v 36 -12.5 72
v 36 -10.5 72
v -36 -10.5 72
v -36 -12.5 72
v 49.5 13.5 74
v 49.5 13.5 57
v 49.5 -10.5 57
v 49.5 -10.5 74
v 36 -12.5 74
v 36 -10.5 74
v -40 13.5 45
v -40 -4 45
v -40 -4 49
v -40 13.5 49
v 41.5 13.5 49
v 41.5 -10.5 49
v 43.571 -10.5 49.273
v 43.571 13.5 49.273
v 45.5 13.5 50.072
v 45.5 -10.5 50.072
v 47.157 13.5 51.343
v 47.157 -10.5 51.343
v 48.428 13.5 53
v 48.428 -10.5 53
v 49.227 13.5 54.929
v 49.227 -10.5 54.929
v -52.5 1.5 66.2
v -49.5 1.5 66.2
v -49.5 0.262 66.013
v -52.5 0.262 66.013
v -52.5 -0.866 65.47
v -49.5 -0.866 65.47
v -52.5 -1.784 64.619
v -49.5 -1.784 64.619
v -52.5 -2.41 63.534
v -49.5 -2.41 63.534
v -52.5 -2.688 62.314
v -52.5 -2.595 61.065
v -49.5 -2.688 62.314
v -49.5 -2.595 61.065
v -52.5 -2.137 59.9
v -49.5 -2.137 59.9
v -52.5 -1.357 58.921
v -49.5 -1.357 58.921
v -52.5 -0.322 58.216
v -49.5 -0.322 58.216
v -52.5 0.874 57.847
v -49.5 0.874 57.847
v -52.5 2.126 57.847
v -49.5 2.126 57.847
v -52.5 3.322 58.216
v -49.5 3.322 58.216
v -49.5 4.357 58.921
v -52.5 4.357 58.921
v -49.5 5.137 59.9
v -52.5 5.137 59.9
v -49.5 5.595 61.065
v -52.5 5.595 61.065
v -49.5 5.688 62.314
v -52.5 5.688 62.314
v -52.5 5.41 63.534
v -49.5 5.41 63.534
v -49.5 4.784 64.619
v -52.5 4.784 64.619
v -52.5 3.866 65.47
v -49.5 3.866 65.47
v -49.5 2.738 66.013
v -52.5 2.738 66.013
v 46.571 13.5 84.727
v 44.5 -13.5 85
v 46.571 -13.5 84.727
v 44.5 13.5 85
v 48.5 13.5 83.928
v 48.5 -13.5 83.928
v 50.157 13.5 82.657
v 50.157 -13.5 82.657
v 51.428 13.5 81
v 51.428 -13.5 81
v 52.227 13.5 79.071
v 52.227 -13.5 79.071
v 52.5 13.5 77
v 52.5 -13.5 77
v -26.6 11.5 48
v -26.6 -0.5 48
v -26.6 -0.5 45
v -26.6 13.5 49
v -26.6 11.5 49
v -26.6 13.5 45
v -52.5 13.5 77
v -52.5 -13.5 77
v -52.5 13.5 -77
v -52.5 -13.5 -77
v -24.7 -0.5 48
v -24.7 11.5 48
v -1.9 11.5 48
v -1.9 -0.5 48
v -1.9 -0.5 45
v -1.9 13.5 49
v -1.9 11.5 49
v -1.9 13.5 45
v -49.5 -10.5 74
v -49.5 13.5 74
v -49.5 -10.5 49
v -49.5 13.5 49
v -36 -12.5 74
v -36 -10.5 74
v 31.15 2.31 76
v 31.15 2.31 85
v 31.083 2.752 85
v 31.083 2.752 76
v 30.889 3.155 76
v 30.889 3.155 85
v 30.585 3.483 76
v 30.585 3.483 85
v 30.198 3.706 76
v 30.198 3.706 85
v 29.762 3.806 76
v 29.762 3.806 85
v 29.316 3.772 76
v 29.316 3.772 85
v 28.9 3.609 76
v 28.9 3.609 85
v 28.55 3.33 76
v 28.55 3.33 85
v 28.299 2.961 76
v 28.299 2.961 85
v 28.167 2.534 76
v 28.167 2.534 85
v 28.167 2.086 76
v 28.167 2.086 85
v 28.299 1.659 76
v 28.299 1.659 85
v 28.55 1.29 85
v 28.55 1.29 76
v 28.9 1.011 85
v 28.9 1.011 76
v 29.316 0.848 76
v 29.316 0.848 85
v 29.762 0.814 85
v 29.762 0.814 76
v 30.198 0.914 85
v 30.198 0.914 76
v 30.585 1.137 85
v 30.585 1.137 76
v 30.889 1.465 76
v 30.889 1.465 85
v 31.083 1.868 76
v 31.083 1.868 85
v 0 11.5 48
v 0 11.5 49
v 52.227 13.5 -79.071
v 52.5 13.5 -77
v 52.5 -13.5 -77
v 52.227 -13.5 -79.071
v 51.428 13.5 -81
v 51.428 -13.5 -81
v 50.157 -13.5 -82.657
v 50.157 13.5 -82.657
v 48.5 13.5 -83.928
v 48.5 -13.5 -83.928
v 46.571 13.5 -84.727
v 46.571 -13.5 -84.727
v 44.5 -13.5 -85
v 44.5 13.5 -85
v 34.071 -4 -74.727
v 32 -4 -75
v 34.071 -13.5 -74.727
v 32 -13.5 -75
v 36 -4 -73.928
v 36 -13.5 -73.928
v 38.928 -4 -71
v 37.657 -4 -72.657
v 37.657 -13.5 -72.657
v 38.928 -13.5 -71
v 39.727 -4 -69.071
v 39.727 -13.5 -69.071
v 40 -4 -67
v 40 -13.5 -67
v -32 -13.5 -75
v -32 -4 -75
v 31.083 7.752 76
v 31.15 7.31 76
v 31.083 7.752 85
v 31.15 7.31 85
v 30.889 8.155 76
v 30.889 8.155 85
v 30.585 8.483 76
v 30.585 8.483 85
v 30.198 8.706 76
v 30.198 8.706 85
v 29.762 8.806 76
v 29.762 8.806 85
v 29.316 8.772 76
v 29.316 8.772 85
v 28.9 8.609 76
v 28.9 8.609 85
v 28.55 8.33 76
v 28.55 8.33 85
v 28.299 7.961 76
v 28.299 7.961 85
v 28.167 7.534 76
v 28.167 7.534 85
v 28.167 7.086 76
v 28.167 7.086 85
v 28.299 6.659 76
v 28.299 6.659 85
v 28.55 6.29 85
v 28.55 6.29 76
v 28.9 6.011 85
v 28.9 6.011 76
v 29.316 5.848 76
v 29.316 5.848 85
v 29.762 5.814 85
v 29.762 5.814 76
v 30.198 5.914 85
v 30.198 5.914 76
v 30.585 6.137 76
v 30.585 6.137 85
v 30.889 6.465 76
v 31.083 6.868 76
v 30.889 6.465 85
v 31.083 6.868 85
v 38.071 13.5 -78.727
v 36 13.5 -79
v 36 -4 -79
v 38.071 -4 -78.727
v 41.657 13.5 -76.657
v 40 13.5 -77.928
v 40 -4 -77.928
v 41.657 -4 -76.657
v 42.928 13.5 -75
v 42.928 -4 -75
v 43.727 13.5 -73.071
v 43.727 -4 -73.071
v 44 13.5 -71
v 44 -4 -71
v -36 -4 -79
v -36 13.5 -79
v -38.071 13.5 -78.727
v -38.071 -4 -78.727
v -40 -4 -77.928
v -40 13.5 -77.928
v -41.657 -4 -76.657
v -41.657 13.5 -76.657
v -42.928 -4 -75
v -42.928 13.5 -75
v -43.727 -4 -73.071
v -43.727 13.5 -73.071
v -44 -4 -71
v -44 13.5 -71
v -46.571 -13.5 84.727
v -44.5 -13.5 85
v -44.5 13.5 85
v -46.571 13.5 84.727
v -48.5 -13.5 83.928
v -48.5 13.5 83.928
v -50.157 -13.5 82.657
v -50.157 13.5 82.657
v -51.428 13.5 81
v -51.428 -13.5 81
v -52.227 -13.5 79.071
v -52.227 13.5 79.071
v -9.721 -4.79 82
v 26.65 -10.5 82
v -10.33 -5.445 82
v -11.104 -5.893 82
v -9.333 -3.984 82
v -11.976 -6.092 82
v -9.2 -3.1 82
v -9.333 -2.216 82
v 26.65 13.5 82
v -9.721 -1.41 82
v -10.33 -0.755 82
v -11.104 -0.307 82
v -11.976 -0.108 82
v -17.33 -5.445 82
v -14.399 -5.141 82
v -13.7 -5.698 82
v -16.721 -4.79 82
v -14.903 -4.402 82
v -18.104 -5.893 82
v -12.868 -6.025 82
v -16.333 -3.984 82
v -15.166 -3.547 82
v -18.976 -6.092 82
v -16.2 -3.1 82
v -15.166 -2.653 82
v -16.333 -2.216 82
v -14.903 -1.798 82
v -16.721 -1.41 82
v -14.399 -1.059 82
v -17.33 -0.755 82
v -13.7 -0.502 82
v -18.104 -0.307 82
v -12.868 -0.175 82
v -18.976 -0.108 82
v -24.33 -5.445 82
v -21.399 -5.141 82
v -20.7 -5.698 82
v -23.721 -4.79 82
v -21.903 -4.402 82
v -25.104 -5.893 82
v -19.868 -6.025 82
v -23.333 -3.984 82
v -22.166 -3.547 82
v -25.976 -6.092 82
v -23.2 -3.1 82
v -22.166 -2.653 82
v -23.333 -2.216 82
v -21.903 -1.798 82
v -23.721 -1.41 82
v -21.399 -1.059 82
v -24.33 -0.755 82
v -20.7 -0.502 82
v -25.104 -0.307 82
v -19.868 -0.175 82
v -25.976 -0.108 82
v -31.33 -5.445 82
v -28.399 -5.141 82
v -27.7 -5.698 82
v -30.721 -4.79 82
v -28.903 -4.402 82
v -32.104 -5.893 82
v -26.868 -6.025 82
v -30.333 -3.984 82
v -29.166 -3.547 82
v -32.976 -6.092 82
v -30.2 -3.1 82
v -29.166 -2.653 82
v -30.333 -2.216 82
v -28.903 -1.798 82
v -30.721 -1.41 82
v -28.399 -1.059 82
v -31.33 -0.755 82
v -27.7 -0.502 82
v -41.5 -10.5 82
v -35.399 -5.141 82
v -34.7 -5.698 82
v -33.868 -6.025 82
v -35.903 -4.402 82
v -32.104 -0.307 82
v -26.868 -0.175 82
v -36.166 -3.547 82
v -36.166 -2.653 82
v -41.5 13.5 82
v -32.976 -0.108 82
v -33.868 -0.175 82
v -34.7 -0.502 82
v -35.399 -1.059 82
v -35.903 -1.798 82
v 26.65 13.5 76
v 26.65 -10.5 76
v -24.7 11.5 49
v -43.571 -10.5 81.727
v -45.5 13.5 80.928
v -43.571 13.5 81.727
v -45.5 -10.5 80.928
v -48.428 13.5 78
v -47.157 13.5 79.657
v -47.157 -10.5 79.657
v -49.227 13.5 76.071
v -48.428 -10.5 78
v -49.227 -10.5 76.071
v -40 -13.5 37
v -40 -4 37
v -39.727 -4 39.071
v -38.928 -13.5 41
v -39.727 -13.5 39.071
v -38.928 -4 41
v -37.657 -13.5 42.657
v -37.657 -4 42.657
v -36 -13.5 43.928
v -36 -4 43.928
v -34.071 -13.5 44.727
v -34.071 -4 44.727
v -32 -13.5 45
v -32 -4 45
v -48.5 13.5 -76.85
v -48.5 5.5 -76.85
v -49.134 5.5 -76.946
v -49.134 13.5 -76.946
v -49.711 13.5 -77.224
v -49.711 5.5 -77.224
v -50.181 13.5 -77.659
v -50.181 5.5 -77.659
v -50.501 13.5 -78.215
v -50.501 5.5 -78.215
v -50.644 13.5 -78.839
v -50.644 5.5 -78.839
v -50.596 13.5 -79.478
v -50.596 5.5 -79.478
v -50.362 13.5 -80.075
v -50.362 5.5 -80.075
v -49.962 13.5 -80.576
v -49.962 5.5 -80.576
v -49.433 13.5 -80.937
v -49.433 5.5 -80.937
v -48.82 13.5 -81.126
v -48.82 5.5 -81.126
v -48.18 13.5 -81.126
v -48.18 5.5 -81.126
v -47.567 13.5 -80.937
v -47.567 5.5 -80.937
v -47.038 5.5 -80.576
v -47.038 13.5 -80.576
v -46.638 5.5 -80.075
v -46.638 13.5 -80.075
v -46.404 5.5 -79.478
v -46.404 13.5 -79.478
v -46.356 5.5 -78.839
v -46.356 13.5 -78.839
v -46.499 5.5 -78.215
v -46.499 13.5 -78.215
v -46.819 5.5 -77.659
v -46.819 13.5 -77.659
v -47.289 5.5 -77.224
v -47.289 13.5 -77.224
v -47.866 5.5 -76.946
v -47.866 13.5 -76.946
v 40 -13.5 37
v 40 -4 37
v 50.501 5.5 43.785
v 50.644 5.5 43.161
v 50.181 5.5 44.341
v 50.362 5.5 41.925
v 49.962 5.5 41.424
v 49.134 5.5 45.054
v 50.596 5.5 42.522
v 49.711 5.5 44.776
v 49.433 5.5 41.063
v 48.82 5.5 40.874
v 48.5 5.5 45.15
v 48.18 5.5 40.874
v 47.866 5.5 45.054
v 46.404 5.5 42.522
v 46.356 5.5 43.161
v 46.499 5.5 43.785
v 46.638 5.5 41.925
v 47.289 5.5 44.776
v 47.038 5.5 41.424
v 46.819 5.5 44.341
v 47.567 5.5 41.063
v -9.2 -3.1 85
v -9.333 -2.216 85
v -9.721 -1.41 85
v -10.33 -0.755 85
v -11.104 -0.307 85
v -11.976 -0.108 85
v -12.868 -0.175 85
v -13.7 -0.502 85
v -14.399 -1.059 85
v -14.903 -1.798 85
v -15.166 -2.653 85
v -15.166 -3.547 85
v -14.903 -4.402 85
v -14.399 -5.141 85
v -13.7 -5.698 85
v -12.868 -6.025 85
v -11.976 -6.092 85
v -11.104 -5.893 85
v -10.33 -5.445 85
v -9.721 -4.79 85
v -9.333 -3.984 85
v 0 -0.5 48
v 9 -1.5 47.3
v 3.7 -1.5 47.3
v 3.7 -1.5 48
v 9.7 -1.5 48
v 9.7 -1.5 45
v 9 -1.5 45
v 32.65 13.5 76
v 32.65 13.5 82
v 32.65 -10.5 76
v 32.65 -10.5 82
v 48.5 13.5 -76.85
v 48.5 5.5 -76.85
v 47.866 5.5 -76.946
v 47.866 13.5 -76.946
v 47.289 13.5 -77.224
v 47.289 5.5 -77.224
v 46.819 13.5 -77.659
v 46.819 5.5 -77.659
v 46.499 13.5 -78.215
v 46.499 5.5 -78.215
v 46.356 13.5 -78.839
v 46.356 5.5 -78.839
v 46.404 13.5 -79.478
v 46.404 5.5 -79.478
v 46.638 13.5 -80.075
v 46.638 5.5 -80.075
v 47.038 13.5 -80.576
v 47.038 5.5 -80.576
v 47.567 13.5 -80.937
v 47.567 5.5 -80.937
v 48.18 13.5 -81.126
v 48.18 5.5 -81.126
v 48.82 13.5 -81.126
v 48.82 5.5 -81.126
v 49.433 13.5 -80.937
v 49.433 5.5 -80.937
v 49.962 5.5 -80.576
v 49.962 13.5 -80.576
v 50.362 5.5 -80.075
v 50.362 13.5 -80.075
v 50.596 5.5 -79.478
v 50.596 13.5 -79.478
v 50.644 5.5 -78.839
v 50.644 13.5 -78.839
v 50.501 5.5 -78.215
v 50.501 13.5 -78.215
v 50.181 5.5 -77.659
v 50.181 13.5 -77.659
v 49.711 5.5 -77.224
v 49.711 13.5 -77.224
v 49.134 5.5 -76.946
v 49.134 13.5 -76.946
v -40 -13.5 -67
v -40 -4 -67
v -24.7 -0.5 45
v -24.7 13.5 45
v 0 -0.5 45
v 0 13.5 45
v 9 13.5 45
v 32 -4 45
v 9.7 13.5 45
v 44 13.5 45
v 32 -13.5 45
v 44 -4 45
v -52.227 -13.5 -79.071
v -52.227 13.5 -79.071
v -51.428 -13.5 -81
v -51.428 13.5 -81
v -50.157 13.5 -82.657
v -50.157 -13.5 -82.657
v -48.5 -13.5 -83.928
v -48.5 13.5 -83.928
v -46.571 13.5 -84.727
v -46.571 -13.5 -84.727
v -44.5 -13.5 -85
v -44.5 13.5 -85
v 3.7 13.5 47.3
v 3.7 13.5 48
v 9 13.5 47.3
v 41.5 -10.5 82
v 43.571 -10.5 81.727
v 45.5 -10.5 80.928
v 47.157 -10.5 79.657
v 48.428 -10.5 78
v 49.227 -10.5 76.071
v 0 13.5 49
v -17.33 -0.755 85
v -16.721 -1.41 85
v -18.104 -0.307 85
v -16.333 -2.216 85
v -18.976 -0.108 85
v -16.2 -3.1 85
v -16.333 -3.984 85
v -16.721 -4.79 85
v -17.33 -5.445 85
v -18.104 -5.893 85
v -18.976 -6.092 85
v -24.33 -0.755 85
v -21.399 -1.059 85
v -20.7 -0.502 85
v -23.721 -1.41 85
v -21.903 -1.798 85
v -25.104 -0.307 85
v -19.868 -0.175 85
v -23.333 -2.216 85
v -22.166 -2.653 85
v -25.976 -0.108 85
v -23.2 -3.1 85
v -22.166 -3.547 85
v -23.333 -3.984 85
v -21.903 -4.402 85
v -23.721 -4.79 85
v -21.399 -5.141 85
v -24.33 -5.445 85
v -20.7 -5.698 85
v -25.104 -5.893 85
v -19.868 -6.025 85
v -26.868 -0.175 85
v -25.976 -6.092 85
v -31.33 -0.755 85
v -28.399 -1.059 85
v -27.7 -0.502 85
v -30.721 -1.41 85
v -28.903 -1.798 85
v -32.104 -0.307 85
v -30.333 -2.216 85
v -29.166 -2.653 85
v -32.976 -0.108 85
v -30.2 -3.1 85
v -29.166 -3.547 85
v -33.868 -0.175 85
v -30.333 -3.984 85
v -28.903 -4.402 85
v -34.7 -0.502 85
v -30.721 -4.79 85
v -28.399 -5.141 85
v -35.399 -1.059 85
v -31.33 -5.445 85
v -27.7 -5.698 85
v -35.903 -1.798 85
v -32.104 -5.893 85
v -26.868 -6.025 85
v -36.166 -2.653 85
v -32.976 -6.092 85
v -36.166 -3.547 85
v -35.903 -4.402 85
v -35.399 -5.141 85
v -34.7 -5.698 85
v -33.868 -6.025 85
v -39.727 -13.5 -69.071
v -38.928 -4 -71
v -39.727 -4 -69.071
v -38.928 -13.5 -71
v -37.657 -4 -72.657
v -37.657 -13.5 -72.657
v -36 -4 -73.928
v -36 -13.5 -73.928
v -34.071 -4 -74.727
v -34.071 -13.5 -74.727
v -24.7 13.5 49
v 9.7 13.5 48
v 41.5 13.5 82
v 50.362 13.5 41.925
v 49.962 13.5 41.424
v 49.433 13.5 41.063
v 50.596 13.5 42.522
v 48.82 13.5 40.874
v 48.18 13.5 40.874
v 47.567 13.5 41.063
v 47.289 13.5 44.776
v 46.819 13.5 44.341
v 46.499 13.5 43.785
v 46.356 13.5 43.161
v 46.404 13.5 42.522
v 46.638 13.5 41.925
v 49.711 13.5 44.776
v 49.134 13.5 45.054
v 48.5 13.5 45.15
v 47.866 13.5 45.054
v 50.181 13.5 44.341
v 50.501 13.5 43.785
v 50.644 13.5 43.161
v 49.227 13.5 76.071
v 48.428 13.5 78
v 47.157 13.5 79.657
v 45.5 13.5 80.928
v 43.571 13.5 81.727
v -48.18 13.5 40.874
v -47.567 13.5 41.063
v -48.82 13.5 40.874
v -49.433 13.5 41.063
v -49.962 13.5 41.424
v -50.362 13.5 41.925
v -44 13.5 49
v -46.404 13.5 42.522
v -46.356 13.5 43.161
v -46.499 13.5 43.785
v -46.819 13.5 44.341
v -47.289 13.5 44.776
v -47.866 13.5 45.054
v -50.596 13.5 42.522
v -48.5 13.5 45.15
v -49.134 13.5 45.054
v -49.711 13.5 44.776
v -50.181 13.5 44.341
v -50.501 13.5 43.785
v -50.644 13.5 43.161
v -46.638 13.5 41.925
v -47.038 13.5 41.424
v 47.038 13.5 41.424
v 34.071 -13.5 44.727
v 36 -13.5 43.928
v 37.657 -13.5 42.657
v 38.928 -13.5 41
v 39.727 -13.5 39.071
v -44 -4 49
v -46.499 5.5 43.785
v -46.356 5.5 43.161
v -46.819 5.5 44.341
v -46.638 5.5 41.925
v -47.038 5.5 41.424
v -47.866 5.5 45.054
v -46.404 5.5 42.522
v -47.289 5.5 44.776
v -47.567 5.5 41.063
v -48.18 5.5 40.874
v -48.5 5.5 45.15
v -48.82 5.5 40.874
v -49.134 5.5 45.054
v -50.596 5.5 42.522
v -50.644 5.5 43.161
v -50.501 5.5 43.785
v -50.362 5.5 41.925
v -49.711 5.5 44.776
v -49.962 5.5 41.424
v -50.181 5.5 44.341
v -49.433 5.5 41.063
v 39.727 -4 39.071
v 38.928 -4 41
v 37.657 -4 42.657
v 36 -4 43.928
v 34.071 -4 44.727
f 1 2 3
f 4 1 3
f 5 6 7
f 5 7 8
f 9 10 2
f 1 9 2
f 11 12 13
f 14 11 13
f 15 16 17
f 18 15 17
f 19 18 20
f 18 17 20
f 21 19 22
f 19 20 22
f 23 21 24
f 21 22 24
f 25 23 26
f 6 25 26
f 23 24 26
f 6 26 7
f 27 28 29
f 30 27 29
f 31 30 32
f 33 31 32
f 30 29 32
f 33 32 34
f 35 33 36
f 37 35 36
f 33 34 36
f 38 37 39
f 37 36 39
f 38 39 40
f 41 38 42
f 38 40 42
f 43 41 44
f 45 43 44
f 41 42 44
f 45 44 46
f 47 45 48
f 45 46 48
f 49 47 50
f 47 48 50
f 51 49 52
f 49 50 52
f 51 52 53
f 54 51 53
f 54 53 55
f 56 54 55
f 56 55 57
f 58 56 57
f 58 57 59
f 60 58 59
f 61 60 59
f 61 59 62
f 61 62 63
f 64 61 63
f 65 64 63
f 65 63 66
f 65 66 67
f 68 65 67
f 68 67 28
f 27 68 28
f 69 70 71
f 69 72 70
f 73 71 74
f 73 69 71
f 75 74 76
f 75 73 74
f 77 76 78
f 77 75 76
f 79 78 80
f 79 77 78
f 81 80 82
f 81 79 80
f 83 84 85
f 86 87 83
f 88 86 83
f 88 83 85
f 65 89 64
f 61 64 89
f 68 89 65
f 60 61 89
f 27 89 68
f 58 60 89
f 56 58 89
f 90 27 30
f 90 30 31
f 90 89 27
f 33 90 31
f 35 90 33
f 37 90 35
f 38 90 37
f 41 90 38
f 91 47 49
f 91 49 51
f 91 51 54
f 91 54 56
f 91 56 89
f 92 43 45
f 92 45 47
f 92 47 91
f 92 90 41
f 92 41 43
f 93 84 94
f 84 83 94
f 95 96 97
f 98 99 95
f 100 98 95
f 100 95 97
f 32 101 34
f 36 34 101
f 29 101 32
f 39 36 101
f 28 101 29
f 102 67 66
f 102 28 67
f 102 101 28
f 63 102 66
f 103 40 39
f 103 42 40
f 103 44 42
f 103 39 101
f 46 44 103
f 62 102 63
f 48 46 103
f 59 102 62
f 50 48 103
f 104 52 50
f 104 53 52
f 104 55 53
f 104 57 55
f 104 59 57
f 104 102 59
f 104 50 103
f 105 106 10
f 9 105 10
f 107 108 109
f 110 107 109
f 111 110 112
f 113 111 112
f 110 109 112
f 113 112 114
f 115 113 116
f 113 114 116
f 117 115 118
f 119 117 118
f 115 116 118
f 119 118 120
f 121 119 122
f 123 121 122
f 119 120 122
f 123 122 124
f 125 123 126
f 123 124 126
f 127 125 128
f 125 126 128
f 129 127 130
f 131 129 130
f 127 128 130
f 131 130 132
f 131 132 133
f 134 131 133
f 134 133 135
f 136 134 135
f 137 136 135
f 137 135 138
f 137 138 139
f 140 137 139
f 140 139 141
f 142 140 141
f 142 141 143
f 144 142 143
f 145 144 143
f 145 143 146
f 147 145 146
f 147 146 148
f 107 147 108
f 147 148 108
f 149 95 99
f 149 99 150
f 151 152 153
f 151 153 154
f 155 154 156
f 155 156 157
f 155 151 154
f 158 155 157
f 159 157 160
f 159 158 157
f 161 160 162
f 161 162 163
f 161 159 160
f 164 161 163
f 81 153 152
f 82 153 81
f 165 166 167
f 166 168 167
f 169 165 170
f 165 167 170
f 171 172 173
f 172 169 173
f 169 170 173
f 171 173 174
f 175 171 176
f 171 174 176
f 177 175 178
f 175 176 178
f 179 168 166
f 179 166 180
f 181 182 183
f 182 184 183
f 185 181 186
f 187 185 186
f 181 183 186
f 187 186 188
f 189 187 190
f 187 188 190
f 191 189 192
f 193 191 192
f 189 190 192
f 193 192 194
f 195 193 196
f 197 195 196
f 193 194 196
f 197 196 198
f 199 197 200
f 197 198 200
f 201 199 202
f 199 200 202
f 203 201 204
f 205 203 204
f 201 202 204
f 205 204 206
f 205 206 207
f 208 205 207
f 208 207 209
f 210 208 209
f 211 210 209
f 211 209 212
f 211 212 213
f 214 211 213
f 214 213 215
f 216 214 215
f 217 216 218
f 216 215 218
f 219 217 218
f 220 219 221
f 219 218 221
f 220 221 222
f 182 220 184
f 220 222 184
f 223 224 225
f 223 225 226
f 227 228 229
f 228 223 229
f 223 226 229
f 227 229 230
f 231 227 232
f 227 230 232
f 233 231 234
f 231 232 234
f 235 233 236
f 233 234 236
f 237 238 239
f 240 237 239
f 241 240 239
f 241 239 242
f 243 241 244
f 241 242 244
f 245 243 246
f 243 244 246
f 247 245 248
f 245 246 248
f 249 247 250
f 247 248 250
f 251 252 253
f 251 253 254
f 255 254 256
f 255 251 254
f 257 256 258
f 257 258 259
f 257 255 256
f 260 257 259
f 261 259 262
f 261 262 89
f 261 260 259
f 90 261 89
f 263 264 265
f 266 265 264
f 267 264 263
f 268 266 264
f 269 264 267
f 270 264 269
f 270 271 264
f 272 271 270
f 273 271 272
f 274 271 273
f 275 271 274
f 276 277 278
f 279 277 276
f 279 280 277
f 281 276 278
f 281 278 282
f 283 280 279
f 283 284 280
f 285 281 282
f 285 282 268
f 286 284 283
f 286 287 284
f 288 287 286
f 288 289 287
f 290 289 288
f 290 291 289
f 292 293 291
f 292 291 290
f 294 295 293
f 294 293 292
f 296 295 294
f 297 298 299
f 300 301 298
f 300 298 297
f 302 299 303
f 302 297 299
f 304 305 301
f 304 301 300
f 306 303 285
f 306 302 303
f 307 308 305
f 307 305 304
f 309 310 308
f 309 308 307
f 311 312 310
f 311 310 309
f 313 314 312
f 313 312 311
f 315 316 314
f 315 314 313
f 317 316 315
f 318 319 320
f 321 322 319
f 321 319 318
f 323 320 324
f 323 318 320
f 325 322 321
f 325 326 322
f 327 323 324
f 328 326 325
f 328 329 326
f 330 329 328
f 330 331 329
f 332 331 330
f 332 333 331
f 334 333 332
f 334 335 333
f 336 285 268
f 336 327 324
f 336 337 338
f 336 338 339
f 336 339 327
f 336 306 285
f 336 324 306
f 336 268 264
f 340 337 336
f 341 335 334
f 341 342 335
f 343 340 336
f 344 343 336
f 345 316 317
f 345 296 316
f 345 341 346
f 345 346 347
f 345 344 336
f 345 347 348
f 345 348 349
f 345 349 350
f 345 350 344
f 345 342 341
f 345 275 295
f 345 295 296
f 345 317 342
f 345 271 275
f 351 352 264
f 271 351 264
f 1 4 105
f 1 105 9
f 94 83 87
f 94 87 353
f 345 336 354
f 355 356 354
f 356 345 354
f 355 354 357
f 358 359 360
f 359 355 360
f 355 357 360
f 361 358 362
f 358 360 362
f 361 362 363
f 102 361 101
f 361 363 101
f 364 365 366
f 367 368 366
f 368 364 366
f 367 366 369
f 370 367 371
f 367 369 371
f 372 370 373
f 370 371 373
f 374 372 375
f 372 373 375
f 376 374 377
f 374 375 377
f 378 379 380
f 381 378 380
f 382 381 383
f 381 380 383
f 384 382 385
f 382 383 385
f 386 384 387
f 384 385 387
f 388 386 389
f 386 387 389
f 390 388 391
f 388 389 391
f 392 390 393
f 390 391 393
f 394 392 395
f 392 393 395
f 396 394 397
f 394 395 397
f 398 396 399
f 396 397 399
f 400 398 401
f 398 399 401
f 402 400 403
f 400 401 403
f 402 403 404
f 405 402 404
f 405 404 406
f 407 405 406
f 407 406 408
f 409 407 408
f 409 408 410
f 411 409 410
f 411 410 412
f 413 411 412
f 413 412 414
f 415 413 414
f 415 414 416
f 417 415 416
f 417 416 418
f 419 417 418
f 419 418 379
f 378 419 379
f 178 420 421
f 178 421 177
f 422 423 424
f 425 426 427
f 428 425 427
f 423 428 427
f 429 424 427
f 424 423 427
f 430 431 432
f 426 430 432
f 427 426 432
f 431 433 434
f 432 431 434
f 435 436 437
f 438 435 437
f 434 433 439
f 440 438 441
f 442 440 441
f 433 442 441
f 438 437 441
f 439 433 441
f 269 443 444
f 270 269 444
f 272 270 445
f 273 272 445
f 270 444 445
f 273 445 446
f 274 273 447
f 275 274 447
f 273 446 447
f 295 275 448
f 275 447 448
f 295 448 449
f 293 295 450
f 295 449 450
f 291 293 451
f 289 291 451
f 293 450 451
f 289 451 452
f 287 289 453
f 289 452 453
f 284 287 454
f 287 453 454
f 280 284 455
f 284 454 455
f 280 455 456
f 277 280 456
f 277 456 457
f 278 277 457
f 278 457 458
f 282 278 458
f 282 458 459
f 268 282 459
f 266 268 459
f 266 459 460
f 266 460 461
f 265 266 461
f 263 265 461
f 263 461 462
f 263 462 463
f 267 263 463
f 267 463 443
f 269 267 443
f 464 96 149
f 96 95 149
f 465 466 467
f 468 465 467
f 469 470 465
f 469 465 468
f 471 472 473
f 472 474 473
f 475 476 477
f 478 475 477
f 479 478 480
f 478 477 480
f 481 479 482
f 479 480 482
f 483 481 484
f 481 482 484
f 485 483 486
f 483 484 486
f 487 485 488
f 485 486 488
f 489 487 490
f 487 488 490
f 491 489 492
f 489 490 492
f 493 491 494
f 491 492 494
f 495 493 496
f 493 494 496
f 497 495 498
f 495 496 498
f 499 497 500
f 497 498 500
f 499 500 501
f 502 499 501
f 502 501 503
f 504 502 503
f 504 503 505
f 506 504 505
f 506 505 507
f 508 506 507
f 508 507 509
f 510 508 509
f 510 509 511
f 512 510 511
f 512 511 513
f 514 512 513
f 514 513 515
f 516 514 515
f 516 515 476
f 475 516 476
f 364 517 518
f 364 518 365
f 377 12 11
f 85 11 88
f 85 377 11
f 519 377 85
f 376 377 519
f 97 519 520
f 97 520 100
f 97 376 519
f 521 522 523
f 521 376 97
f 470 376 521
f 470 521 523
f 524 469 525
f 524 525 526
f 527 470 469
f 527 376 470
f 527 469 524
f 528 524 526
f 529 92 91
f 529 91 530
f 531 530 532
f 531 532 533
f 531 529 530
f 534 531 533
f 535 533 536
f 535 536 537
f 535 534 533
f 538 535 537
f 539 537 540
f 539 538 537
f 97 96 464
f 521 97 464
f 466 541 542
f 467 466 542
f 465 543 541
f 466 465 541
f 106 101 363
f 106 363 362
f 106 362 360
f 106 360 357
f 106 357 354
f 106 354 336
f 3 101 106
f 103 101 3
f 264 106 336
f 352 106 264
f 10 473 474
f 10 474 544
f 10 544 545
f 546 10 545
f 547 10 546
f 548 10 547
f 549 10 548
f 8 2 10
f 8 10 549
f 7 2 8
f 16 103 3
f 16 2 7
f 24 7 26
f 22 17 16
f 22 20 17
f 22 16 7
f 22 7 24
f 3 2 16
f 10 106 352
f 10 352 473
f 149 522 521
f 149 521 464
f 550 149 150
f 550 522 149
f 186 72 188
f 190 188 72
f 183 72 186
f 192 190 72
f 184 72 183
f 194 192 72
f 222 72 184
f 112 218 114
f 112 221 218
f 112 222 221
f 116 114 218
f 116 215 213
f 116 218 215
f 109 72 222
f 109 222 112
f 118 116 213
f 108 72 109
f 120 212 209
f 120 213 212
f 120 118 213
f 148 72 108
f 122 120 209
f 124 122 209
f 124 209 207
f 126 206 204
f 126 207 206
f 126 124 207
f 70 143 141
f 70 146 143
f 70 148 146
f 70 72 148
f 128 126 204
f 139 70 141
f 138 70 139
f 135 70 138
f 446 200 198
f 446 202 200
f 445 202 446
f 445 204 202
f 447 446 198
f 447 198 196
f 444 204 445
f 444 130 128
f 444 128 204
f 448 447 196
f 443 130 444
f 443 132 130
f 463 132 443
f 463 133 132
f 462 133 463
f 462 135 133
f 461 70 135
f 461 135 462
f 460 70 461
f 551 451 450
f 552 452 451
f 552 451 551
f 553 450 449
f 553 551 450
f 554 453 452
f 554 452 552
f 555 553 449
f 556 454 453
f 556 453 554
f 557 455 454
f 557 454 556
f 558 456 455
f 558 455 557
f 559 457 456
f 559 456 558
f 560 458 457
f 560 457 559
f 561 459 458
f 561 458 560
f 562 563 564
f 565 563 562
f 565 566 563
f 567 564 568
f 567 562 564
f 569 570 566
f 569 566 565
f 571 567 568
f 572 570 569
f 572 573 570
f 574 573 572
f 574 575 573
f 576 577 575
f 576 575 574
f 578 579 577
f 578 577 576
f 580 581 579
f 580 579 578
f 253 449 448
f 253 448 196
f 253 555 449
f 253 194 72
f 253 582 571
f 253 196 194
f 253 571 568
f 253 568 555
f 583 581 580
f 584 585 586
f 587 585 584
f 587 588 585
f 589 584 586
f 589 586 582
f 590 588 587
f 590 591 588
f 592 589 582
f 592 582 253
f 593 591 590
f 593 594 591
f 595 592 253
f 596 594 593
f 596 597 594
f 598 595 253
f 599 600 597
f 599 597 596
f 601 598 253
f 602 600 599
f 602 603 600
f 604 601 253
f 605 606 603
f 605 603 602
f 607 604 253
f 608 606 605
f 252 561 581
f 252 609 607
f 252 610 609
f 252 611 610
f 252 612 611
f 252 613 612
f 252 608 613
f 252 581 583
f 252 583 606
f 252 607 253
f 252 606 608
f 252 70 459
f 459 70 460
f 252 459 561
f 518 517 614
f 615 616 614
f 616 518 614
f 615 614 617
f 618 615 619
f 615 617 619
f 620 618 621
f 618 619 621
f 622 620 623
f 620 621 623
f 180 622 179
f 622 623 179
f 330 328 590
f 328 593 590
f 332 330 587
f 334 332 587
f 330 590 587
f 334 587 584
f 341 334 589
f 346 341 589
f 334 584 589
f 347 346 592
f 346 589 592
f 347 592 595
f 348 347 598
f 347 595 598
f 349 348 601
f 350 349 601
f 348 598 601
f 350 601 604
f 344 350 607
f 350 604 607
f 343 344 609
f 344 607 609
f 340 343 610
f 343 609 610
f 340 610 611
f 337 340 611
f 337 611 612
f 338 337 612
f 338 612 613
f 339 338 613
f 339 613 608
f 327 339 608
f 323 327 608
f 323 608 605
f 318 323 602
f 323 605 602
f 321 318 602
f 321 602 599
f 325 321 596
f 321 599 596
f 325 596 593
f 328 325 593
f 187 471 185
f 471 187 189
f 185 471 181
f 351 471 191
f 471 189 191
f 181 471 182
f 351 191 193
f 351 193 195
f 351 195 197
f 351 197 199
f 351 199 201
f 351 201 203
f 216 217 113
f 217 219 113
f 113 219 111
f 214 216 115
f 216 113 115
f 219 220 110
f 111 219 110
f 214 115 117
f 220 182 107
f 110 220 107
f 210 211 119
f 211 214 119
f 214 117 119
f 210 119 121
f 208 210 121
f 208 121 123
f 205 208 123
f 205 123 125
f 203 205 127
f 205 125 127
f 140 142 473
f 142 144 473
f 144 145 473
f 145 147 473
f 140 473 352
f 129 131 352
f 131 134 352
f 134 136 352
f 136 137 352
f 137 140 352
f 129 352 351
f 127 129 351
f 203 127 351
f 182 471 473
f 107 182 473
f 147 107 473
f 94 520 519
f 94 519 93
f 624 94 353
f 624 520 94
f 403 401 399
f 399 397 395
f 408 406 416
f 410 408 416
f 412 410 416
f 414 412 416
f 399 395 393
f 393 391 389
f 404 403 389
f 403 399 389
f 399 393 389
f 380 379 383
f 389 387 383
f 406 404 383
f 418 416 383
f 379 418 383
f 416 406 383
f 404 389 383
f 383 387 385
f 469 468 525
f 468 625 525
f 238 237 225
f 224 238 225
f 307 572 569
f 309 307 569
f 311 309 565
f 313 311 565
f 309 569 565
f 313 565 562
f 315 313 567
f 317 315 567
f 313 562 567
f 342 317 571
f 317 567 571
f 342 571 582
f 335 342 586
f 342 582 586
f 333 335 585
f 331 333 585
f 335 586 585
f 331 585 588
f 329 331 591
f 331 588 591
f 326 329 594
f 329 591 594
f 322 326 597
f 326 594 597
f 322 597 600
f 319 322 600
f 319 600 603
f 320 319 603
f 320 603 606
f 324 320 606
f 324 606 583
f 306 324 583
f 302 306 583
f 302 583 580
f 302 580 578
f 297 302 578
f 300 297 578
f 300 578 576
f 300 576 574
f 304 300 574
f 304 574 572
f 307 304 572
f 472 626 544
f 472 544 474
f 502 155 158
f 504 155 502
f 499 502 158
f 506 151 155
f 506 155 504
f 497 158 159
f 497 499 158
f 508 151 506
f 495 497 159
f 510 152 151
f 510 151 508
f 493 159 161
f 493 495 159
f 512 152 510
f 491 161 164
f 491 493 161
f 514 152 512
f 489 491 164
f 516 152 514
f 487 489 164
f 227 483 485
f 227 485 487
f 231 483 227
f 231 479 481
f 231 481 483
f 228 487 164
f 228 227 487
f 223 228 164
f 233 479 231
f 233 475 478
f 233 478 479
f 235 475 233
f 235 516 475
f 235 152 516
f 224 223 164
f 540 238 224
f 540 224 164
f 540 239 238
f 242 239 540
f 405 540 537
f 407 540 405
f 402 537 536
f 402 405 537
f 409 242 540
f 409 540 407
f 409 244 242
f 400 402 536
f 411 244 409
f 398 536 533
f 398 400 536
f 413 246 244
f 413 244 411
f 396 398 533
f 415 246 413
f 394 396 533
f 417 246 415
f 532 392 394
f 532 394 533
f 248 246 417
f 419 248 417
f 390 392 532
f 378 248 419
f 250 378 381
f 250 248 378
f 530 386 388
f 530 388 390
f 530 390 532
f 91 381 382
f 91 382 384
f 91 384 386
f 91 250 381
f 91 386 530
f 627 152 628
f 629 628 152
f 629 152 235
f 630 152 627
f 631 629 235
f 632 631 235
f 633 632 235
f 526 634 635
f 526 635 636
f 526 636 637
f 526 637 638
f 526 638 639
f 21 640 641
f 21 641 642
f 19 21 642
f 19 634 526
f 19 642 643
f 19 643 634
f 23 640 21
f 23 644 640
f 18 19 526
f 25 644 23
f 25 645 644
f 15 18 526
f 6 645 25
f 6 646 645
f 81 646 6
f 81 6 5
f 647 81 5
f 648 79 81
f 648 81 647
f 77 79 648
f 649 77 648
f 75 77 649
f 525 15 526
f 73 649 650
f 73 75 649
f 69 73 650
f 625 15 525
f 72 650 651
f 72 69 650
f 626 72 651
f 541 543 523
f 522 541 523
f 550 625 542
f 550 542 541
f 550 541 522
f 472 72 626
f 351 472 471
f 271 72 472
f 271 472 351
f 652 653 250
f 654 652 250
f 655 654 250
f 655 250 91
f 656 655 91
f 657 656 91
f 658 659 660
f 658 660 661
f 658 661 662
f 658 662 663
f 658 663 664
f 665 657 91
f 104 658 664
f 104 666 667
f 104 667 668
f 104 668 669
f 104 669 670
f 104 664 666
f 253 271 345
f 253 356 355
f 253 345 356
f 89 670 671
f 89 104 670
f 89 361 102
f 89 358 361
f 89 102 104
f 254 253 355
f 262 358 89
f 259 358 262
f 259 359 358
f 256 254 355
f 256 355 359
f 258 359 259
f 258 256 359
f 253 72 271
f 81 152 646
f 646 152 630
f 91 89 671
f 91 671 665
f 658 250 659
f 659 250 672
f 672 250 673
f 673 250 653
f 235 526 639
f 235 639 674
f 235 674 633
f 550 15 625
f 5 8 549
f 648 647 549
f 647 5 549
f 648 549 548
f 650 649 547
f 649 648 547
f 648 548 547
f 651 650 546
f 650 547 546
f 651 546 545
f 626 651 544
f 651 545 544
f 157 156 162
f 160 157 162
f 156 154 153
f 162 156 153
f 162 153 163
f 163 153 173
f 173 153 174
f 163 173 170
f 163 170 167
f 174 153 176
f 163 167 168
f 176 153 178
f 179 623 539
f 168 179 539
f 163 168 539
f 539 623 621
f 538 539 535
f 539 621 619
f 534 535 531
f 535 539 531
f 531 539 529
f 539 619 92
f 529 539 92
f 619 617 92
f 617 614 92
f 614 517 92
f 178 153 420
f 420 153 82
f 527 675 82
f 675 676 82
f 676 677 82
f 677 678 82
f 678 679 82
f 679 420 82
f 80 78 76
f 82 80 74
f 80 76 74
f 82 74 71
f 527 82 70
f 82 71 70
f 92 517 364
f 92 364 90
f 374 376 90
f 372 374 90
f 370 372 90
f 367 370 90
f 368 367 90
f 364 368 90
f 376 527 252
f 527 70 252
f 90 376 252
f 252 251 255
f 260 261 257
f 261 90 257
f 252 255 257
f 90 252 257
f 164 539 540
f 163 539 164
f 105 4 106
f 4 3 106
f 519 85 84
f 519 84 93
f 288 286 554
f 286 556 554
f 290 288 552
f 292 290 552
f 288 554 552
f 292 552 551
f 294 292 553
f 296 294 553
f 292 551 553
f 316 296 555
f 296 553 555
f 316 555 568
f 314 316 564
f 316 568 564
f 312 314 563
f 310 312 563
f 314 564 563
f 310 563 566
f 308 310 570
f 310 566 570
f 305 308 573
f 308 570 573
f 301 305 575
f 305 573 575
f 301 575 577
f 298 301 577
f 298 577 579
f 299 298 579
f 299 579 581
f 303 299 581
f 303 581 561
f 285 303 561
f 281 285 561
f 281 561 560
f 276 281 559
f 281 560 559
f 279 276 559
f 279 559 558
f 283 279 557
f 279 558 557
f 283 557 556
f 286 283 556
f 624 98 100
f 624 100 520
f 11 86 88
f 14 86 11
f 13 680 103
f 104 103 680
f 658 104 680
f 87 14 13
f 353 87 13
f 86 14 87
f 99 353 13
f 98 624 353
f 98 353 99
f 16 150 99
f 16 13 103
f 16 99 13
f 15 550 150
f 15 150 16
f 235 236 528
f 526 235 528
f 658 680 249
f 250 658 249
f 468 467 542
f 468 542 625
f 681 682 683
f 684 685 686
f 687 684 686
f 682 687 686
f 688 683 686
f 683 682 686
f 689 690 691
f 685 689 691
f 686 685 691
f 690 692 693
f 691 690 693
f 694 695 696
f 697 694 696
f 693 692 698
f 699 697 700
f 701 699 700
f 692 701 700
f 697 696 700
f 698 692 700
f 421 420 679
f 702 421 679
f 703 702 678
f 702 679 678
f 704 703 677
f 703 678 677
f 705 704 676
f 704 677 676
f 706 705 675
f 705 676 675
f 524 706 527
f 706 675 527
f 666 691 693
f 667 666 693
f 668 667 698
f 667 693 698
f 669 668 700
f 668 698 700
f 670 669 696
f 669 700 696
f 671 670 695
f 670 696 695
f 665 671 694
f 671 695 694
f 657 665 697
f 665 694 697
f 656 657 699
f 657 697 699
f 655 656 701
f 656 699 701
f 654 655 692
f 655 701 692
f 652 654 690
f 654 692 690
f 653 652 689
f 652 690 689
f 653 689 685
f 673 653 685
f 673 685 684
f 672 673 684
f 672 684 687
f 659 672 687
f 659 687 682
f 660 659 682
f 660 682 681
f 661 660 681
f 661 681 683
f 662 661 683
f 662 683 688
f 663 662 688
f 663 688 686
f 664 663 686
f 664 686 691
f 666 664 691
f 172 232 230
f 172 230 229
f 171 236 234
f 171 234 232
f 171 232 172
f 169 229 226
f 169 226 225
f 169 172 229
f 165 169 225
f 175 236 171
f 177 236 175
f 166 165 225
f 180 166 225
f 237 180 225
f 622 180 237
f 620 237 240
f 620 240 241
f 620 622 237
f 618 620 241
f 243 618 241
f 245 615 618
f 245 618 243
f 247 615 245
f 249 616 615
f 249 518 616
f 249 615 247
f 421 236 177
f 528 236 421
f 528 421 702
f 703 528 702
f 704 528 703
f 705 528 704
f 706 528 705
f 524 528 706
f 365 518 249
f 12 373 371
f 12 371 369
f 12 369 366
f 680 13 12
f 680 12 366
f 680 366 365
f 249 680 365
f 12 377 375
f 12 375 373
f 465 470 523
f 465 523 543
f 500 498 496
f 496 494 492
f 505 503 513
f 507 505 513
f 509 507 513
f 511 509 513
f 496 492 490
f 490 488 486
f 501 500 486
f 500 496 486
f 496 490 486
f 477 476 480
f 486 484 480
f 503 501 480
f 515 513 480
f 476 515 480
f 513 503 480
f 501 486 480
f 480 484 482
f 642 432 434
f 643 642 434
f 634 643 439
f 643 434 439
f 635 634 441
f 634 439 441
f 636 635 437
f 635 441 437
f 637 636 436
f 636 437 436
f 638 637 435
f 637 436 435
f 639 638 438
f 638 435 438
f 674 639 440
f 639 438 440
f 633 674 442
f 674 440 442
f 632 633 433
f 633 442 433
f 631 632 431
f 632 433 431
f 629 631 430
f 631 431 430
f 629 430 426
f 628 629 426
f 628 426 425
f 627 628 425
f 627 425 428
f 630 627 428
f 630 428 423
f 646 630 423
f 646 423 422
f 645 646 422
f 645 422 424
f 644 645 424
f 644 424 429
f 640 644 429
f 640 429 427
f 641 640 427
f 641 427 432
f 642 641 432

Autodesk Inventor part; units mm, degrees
ref_plane "YZ Plane" through (0, 0, 0) normal (1, 0, 0) x (0, 1, 0)
ref_plane "XZ Plane" through (0, 0, 0) normal (0, 1, 0) x (-1, 0, 0)
ref_plane "XY Plane" through (0, 0, 0) normal (0, 0, 1) x (1, 0, 0)
sketch "Sketch1" plane through (0, 0, 0) normal (0, 1, 0) x (-1, 0, 0)
  line L0 (-52.5, 85) -> (52.5, 85)
  line L1 (52.5, 85) -> (52.5, -85)
  line L2 (52.5, -85) -> (-52.5, -85)
  line L3 (-52.5, -85) -> (-52.5, 85)
  line L4 (-52.5, 85) -> (52.5, -85) construction
  line L5 (52.5, 85) -> (-52.5, -85) construction
  line L6 (40, 45) -> (-40, 45)
  line L7 (-40, 45) -> (-40, -75)
  line L8 (-40, -75) -> (40, -75)
  line L9 (40, -75) -> (40, 45)
  point P0 (0, 0)
  point P1 (0, -75)
  point P2 (0, 0)
  point P3 (0, -85)
  dimension "d0" = 120
  dimension "d1" = 80
  dimension "d2" = 105
  dimension "d3" = 10
  dimension "d4" = 170
extrude "Extrusion1" add sketch "Sketch1" along normal mid plane 27
sketch "Sketch2" plane through (0, 0, 0) normal (0, 1, 0) x (-1, 0, 0)
  line L0 (44, -79) -> (-44, -79)
  line L1 (-44, -79) -> (-44, 45)
  line L2 (-44, 45) -> (44, 45)
  line L3 (44, 45) -> (44, -79)
  line L4 (-40, -75) -> (40, -75) projected
  line L5 (40, -75) -> (40, 45) projected
  line L6 (-40, 45) -> (-40, -75) projected
  point P0 (0, 0)
  dimension "d7" = 4
  dimension "d8" = 4
  dimension "d9" = 4
extrude "Extrusion2" cut sketch "Sketch2" along normal blind 15 and the other way blind 4
sketch "Sketch3" plane through (0, 13.5, 0) normal (0, 1, 0) x (1, 0, 0)
  line L0 (-49.5, -49) -> (49.5, -49)
  line L1 (49.5, -49) -> (49.5, -82)
  line L2 (49.5, -82) -> (-49.5, -82)
  line L3 (-49.5, -82) -> (-49.5, -49)
  line L4 (-52.5, 85) -> (-52.5, -85) projected
  line L5 (-52.5, -85) -> (52.5, -85) projected
  line L6 (44, -45) -> (-44, -45) projected
  point P0 (0, 0)
  point P1 (0, -49)
  dimension "d14" = 3
  dimension "d15" = 3
  dimension "d16" = 4
extrude "Extrusion3" cut sketch "Sketch3" against normal blind 24
sketch "Sketch4" plane through (0, 13.5, 0) normal (0, 1, 0) x (1, 0, 0)
  line L0 (44, -45) -> (-44, -45) projected
  line L1 (-49.5, -49) -> (49.5, -49) projected
  line L2 (-44, -45) -> (-40, -45)
  line L3 (-40, -45) -> (-40, -49)
  line L4 (-40, -49) -> (-44, -49)
  line L5 (-44, -49) -> (-44, -45)
  point P0 (0, 0)
  point P1 (-40, 75)
extrude "Extrusion4" cut sketch "Sketch4" against normal up to surface (17.5 mm away)
sketch "Sketch5" plane through (0, 13.5, 0) normal (0, 1, 0) x (1, 0, 0)
  line L0 (44, -45) -> (-40, -45) projected
  line L1 (-26.6, -48) -> (-24.7, -48)
  line L2 (-24.7, -48) -> (-24.7, -45)
  line L3 (-24.7, -45) -> (-26.6, -45)
  line L4 (-26.6, -45) -> (-26.6, -48)
  line L5 (-1.9, -48) -> (0, -48)
  line L6 (0, -48) -> (0, -45)
  line L7 (0, -45) -> (-1.9, -45)
  line L8 (-1.9, -45) -> (-1.9, -48)
  line L9 (-40, -45) -> (40, -45) projected
  point P0 (0, 0)
  dimension "d21" = 1.9
  dimension "d22" = 1.9
  dimension "d23" = 22.8
  dimension "d24" = 3
extrude "Extrusion5" cut sketch "Sketch5" against normal blind 14
sketch "Sketch6" plane through (0, 13.5, 0) normal (0, 1, 0) x (1, 0, 0)
  line L0 (-40, -45) -> (40, -45) projected
  line L1 (9, -45) -> (9, -47.3)
  line L2 (9, -47.3) -> (3.7, -47.3)
  line L3 (3.7, -47.3) -> (3.7, -48)
  line L4 (3.7, -48) -> (9.7, -48)
  line L5 (9.7, -48) -> (9.7, -45)
  line L6 (0, -45) -> (0, -48) projected
  point P0 (0, 0)
  dimension "d27" = 0.7
  dimension "d28" = 0.7
  dimension "d29" = 3
  dimension "d30" = 6
  dimension "d31" = 9
extrude "Extrusion6" cut sketch "Sketch6" against normal blind 15
fillet "Fillet1" radius 8 12 edges at (-44, 4.75, -79) (44, 4.75, -79) (40, -8.75, -75) (-40, -8.75, -75) (52.5, 0, -85) (-52.5, 0, -85) (-52.5, 0, 85) (-49.5, 1.5, 82) (49.5, 1.5, 82) (52.5, 0, 85) (40, -8.75, 45) (-40, -8.75, 45)
sketch "Sketch7" plane through (0, -10.5, 0) normal (0, 1, 0) x (1, 0, 0)
  line L0 (-36, -74) -> (36, -74)
  line L1 (36, -74) -> (36, -72)
  line L2 (36, -72) -> (-36, -72)
  line L3 (-36, -72) -> (-36, -74)
  line L4 (41.5, -82) -> (-41.5, -82) projected
  point P0 (0, 0)
  point P1 (0, -72)
  dimension "d35" = 2
  dimension "d36" = 72
  dimension "d37" = 8
extrude "Extrusion7" cut sketch "Sketch7" against normal blind 2
sketch "Sketch8" plane through (-52.5, -13.5, 77) normal (-1, 0, 0) x (0, 0, 1)
  line L0 (0, 0) -> (-154, 0) projected
  line L1 (-3, 3) -> (-3, 27) projected
  point P0 (-77, 13.5)
  point P1 (-15, 15)
  dimension "d40" = 15
  dimension "d41" = 12
hole "Hole1" at (-52.5, 1.5, 62) direction (1, 0, 0) diameter 8.4 depth 8 tip angle 118
fillet "Fillet2" radius 8 1 edges at (49.5, 1.5, 49)
sketch "Sketch9" plane through (0, 13.5, 0) normal (0, 1, 0) x (1, 0, 0)
  line L0 (-48.5, 79) -> (48.5, 79) construction
  line L1 (48.5, 79) -> (48.5, -43) construction
  line L2 (48.5, -43) -> (-48.5, -43) construction
  line L3 (-48.5, -43) -> (-48.5, 79) construction
  line L4 (44.5, 85) -> (-44.5, 85) projected
  line L5 (-52.5, 77) -> (-52.5, -77) projected
  line L6 (-40, -49) -> (41.5, -49) projected
  point P0 (0, 0)
  point P1 (0, 79)
  dimension "d50" = 6
  dimension "d51" = 4
  dimension "d52" = 6
hole "Hole2" at (-48.5, 13.5, -79) at (48.5, 13.5, -79) at (48.5, 13.5, 43) at (-48.5, 13.5, 43) direction (0, -1, 0) diameter 4.3 depth 8
sketch "Sketch10" plane through (-44.5, 13.5, 85) normal (0, 0, 1) x (1, 0, 0)
  circle A0 centre (25.3, -16.6) radius 3
  circle A1 centre (32.3, -16.6) radius 3
  circle A2 centre (18.3, -16.6) radius 3
  circle A3 centre (11.3, -16.6) radius 3
  line L0 (-8, 0) -> (-8, -27) projected
  line L1 (89, -27) -> (0, -27) projected
  point P0 (44.5, -13.5)
  dimension "d60" = 6
  dimension "d61" = 6
  dimension "d62" = 6
  dimension "d63" = 6
  dimension "d64" = 7
  dimension "d65" = 7
  dimension "d66" = 7
  dimension "d67" = 19.3
  dimension "d68" = 10.4
extrude "Extrusion8" cut sketch "Sketch10" against normal blind 10
sketch "Sketch13" plane through (0, -10.5, 0) normal (0, 1, 0) x (1, 0, 0)
  line L0 (41.5, -82) -> (-41.5, -82) projected
  line L1 (26.65, -82) -> (32.65, -82)
  line L2 (32.65, -82) -> (32.65, -76)
  line L3 (32.65, -76) -> (26.65, -76)
  line L4 (26.65, -76) -> (26.65, -82)
  point P0 (0, 0)
  point P1 (52.5, -77)
  dimension "d78" = 6
  dimension "d79" = 6
  dimension "d82" = 19.85
extrude "Extrusion10" add sketch "Sketch13" along normal up to surface (24 mm away)
sketch "Sketch11" plane through (-44.5, 13.5, 85) normal (0, 0, 1) x (1, 0, 0)
  circle A0 centre (74.15, -11.19) radius 1.5
  circle A1 centre (74.15, -6.19) radius 1.5
  line L0 (89, -27) -> (0, -27) projected
  line L1 (97, -27) -> (97, 0) projected
  point P0 (44.5, -13.5)
  dimension "d71" = 3
  dimension "d72" = 3
  dimension "d73" = 5
  dimension "d76" = 20.81
  dimension "d77" = 22.85
extrude "Extrusion9" cut sketch "Sketch11" against normal blind 10
sketch "Sketch14" plane through (0, 13.5, 0) normal (0, 1, 0) x (1, 0, 0)
  line L0 (-24.7, -48) -> (-26.6, -48) projected
  line L1 (-40, -49) -> (41.5, -49) projected
  line L2 (-26.6, -48) -> (-24.7, -48)
  line L3 (-24.7, -48) -> (-24.7, -49)
  line L4 (-24.7, -49) -> (-26.6, -49)
  line L5 (-26.6, -49) -> (-26.6, -48)
  line L6 (0, -48) -> (-1.9, -48) projected
  line L7 (-1.9, -48) -> (0, -48)
  line L8 (0, -48) -> (0, -49)
  line L9 (0, -49) -> (-1.9, -49)
  line L10 (-1.9, -49) -> (-1.9, -48)
  point P0 (0, 0)
extrude "Extrusion11" cut sketch "Sketch14" against normal blind 2
properties part number "Bottom"
